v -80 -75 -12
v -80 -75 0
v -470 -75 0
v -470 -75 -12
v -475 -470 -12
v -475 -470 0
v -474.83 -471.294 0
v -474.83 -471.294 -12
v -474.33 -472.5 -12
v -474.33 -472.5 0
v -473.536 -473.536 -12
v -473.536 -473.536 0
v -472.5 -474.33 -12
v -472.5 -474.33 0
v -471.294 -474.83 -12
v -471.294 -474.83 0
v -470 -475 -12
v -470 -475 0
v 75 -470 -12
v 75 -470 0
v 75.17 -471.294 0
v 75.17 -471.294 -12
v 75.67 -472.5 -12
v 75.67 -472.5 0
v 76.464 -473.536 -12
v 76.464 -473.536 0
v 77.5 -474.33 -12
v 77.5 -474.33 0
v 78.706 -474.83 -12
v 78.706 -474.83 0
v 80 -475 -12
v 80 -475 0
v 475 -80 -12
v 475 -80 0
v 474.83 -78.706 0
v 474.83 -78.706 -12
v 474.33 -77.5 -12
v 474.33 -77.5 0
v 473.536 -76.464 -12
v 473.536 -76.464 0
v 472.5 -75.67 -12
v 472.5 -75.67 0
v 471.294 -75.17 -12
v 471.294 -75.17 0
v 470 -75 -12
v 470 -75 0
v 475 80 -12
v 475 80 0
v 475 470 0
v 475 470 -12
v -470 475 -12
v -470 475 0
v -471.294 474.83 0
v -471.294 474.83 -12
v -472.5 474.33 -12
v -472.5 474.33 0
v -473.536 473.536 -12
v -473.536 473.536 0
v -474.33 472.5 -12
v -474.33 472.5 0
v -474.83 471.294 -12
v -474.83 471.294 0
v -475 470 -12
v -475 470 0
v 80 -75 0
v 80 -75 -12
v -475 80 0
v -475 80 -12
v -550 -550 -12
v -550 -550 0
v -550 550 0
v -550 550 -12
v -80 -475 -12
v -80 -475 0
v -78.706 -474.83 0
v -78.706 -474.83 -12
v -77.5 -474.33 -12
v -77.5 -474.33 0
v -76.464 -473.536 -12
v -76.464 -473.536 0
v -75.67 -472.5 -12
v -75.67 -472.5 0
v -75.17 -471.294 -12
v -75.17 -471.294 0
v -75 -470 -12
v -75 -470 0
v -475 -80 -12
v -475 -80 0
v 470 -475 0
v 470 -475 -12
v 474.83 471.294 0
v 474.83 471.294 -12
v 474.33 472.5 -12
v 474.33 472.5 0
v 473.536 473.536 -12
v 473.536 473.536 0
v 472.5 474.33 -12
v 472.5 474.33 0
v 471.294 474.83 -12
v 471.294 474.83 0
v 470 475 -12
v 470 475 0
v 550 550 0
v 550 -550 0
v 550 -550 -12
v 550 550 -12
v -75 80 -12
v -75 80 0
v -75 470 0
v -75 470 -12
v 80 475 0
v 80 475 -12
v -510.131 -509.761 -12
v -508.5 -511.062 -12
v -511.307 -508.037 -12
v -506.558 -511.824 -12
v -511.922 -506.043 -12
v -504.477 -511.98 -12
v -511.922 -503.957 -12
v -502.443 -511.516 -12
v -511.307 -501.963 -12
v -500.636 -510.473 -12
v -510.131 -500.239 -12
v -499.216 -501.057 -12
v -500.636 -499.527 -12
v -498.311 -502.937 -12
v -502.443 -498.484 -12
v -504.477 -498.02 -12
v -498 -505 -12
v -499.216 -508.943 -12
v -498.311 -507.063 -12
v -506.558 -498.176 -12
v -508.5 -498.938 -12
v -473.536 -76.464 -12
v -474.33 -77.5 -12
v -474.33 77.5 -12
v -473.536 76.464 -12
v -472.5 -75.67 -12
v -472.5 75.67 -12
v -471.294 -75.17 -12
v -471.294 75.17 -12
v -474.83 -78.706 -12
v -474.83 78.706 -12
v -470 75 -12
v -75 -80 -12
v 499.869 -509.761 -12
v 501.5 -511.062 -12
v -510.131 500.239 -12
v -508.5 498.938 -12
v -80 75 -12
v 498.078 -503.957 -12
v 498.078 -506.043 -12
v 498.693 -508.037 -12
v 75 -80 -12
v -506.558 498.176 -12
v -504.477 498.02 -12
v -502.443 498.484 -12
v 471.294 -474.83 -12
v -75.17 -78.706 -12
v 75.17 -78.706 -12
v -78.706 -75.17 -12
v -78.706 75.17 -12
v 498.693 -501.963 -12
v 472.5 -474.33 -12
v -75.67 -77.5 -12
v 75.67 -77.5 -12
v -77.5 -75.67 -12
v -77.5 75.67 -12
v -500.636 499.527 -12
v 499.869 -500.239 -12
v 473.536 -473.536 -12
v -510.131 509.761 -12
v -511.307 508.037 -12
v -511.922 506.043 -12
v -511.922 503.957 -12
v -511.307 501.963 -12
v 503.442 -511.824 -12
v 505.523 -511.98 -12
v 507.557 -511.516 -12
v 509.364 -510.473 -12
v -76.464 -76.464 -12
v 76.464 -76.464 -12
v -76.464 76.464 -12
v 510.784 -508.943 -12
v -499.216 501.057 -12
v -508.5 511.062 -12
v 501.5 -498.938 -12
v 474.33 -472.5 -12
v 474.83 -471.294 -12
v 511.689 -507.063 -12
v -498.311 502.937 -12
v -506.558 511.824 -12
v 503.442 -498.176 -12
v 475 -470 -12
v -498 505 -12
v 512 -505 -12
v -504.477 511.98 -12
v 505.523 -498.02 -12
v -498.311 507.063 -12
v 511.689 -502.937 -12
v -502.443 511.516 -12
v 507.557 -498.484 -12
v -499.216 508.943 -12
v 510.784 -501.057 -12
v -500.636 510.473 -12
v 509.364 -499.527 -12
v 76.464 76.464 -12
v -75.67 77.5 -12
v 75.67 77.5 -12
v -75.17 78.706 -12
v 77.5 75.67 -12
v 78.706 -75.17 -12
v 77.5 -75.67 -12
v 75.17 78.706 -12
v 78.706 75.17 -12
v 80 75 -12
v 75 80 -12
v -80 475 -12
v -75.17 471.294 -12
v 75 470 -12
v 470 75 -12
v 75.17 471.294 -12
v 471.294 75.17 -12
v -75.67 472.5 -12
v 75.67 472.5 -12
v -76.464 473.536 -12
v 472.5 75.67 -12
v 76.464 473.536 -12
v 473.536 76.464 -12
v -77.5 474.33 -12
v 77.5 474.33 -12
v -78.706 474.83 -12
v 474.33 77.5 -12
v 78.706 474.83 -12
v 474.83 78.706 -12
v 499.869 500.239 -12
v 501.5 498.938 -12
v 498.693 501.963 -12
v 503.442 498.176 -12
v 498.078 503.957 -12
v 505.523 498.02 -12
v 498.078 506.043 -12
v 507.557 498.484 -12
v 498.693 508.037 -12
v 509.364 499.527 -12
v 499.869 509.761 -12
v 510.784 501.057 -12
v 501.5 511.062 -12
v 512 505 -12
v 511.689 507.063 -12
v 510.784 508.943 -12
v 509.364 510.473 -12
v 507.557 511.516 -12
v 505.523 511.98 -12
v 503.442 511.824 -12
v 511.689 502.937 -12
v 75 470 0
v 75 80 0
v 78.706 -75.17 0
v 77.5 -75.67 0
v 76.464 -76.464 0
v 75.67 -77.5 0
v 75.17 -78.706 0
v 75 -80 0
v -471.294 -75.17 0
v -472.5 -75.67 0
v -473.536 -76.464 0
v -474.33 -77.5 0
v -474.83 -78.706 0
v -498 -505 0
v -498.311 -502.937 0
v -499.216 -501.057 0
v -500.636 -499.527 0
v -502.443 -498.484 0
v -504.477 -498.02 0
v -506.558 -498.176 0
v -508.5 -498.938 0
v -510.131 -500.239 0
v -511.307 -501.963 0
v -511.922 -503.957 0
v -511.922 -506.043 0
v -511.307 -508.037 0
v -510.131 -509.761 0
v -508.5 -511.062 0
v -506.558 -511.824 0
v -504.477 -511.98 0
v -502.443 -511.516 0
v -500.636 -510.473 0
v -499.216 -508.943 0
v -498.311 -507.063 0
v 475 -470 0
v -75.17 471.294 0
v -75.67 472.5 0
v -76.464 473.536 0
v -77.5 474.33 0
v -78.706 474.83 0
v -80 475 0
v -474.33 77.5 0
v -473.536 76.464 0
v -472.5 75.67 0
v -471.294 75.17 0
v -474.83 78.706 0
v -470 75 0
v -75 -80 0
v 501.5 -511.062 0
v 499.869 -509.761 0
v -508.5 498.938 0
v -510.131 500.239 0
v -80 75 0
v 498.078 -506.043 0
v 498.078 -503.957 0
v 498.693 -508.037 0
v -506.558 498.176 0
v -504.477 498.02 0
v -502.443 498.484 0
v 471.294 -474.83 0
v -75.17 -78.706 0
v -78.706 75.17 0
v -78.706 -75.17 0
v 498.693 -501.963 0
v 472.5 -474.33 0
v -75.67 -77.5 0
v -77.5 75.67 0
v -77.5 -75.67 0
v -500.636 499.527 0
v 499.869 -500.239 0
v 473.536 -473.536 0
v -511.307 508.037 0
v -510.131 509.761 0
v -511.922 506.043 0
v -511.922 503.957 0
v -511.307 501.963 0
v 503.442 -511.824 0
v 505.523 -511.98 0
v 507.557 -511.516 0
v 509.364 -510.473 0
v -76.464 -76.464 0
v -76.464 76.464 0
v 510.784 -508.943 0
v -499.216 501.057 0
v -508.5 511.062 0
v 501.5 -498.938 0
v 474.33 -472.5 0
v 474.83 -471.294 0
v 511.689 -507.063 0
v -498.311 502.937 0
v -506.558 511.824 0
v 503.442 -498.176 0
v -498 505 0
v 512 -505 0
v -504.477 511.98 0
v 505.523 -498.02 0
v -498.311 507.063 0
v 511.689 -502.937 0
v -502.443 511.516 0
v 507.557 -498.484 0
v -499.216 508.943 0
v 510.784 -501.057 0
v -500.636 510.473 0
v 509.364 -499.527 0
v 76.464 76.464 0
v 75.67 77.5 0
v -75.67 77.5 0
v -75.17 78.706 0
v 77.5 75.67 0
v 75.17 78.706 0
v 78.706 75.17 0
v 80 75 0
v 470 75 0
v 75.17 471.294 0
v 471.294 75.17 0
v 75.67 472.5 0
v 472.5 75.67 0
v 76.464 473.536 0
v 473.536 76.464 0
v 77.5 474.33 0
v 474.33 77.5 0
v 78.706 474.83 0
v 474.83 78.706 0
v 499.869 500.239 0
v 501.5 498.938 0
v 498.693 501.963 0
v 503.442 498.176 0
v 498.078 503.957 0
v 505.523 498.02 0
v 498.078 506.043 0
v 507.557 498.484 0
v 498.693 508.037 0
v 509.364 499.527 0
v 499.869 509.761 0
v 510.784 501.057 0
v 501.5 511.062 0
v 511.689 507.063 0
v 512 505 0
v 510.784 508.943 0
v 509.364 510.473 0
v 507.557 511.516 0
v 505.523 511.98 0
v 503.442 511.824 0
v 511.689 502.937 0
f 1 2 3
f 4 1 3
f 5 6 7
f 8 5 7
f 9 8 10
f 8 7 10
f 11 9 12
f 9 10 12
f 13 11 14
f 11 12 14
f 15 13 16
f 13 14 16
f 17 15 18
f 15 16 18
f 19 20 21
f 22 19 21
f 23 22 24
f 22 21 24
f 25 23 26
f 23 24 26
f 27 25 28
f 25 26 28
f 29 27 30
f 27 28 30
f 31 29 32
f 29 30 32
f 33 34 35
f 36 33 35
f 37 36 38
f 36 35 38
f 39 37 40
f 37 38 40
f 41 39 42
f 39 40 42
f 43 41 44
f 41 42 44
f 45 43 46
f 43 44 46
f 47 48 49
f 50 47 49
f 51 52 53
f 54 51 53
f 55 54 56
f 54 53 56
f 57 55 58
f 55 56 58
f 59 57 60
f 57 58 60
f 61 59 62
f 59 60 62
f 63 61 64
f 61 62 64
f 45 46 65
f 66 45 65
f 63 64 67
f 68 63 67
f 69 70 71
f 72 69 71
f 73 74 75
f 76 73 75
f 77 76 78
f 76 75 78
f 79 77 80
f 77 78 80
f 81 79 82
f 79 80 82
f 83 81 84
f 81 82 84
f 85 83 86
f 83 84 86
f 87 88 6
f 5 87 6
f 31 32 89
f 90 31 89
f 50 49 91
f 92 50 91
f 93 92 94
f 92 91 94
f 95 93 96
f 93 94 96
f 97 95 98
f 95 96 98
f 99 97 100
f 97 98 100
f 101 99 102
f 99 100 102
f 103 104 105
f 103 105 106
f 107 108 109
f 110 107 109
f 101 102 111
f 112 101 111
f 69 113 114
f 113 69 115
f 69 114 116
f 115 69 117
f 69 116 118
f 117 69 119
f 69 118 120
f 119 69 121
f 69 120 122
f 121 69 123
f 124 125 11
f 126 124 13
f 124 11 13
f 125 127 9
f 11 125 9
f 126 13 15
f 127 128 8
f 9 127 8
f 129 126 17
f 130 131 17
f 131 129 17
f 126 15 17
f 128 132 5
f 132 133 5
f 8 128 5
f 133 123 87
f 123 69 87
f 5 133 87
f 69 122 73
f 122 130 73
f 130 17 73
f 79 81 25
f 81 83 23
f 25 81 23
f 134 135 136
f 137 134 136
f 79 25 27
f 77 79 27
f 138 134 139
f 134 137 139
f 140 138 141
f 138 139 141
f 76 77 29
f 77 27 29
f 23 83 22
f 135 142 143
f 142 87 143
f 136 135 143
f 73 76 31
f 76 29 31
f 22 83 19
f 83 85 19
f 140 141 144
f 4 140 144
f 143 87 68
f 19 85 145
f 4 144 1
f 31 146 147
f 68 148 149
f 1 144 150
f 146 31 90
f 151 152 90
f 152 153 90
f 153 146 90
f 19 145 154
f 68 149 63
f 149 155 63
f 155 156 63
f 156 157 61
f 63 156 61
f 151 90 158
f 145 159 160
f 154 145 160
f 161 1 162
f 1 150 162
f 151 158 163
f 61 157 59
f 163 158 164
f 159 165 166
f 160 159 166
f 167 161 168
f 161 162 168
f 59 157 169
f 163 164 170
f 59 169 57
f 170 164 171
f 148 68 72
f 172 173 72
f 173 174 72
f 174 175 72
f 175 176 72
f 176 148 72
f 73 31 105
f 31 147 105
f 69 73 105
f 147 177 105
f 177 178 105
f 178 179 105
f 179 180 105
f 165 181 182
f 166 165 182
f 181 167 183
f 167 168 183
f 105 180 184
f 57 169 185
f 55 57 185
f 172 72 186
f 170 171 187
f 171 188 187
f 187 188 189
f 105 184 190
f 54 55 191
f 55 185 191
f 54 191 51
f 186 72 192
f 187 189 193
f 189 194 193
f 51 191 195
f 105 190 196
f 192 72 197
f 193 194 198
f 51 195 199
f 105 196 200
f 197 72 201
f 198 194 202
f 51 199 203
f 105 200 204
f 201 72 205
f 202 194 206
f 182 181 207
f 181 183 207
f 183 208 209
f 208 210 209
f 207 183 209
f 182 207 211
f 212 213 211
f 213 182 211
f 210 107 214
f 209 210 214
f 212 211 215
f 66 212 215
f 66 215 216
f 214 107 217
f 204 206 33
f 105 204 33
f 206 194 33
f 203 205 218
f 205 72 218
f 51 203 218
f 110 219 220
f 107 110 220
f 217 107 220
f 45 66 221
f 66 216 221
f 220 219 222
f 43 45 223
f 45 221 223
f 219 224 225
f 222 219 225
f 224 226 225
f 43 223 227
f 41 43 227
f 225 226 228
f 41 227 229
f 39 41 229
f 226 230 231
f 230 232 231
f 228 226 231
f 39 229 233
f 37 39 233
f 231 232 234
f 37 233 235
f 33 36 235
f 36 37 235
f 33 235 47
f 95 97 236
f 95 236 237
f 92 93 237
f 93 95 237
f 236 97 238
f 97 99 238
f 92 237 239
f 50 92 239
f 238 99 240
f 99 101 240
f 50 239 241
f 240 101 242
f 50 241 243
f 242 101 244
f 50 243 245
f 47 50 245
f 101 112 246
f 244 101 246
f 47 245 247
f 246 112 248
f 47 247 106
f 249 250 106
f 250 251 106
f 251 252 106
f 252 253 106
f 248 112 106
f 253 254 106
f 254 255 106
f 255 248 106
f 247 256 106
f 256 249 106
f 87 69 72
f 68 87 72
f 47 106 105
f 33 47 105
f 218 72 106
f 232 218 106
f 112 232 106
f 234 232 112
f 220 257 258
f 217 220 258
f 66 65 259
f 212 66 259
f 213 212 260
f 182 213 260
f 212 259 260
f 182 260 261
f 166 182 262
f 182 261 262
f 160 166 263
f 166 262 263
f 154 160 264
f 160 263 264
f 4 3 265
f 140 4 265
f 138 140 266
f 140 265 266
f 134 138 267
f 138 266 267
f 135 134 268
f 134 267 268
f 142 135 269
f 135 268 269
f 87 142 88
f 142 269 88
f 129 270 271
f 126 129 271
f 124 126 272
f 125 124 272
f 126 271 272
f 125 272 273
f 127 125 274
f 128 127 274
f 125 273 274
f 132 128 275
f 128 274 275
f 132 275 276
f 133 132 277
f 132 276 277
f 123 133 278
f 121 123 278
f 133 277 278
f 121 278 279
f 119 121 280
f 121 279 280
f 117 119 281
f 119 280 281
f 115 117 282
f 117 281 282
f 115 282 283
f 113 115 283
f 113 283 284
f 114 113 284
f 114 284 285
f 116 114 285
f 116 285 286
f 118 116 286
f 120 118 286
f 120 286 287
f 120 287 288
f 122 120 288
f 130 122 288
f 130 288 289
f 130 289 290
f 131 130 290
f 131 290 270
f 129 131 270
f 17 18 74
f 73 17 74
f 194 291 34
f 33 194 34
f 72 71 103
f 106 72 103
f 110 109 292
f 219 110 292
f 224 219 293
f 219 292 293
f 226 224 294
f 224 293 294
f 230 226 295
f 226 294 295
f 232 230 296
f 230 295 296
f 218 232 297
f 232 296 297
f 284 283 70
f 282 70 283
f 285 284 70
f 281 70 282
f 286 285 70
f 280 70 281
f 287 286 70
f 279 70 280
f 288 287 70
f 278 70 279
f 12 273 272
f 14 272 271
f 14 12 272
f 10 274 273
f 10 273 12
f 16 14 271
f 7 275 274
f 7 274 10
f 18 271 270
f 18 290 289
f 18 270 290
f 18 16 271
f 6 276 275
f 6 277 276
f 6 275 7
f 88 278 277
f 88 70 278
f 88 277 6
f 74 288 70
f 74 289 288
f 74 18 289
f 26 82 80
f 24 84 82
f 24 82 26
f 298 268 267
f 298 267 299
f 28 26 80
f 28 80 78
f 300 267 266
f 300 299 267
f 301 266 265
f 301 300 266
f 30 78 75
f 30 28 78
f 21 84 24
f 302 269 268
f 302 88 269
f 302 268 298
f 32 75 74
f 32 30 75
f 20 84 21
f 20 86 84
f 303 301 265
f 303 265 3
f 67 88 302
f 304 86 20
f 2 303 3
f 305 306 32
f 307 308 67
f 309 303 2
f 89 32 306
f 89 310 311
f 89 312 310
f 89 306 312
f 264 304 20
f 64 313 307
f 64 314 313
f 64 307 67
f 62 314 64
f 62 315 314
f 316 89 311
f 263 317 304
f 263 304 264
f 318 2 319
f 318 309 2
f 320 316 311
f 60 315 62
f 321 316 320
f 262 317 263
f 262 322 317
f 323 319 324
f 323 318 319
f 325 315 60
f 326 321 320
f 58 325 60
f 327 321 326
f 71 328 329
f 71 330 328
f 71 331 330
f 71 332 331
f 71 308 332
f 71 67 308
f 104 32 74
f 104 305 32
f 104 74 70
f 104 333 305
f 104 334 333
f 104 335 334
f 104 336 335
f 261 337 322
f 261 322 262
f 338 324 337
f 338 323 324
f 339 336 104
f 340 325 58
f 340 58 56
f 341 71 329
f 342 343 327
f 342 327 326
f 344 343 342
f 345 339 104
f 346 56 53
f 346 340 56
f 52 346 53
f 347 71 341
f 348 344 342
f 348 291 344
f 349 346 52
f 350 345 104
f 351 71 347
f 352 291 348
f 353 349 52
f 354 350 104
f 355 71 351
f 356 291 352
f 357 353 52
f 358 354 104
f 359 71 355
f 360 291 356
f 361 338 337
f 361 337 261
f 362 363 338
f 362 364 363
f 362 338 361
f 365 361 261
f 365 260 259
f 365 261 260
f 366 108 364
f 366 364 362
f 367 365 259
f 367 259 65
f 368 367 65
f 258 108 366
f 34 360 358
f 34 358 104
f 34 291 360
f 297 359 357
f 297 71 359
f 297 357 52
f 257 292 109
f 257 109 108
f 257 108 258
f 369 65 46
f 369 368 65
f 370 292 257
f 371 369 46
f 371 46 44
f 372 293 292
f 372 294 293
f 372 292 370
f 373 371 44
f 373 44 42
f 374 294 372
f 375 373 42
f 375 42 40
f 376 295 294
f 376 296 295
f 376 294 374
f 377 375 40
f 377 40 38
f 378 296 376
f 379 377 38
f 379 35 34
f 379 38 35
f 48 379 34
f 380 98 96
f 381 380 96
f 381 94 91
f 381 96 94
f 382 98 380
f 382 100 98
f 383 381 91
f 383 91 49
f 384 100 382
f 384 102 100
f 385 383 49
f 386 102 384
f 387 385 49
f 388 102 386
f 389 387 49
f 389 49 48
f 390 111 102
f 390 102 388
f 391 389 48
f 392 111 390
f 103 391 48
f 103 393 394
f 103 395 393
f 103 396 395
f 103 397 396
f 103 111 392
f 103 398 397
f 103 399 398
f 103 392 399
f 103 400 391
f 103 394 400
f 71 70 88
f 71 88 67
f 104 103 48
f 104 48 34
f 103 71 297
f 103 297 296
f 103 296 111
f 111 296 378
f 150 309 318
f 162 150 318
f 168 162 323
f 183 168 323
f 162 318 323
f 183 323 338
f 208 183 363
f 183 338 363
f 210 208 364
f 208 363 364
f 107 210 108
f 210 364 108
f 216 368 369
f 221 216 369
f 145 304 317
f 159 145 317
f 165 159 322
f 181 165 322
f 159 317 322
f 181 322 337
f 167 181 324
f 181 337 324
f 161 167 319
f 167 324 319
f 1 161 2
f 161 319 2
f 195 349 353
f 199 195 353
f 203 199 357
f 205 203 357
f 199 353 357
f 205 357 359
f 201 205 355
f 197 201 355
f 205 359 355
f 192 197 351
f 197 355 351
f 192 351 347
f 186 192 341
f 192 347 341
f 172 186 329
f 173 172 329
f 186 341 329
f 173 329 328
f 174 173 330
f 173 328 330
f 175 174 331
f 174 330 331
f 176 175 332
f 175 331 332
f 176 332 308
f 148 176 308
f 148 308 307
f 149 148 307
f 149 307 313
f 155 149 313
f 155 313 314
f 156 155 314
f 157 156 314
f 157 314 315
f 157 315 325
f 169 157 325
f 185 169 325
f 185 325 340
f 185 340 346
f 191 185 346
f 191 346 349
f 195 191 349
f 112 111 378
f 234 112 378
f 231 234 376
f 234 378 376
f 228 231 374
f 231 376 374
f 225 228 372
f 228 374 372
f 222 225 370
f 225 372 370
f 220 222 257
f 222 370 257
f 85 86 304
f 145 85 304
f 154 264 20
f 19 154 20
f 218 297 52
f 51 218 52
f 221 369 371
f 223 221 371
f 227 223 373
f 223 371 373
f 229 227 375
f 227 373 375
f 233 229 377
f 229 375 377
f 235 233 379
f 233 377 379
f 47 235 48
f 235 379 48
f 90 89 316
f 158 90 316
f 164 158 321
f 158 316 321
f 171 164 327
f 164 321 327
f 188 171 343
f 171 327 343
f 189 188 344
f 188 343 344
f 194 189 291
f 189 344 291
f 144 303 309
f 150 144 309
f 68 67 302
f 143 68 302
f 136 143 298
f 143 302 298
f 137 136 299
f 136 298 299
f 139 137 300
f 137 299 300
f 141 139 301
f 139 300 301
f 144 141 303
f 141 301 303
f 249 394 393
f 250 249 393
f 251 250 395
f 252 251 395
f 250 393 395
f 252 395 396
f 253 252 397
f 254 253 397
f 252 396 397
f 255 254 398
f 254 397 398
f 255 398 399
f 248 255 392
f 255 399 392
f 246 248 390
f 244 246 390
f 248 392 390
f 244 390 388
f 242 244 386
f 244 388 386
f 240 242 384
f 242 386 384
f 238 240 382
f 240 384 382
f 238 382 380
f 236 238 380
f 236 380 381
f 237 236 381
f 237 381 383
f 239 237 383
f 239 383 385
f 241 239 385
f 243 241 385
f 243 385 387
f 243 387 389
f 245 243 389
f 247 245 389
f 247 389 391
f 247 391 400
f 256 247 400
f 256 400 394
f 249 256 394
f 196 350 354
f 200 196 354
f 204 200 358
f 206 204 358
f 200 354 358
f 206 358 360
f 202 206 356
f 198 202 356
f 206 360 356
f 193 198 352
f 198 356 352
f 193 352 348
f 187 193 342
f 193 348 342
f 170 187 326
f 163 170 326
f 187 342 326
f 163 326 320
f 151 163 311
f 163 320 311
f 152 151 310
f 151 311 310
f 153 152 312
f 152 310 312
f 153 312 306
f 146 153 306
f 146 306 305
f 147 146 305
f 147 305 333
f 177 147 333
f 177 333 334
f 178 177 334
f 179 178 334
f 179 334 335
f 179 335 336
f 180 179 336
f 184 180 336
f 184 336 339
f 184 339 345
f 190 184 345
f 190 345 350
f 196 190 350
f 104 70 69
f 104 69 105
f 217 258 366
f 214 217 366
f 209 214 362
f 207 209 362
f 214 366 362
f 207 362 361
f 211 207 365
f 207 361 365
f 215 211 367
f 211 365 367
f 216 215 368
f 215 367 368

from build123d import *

# Parameters (mm, degrees)
F0_W     = 1100
F0_H     = 1100
F1_DEPTH = 12
F2_R     = 7
F3_DEPTH = 25
F5_DEPTH = 25


# Not quite as in the source:
# - a feature names something its author has since deleted; it is built from what else it names


with BuildPart() as f1:
    # F0 (on Top) → F1 (new body)
    with BuildSketch(Plane.XY):
        Rectangle(F0_W, F0_H)
    extrude(amount=-F1_DEPTH)

    # F2 (on Top) → F3 (cut)
    with BuildSketch(Plane.XY):
        with Locations((-505, -505)):
            Circle(F2_R)
        with Locations((505, 505)):
            Circle(F2_R)
        with Locations((-505, 505)):
            Circle(F2_R)
        with Locations((505, -505)):
            Circle(F2_R)
    extrude(amount=-F3_DEPTH, mode=Mode.SUBTRACT)

    # F4 (on Top) → F5 (cut)
    with BuildSketch(Plane.XY):
        with BuildLine():
            Line((-80, 475), (-470, 475))
            ThreePointArc((-470, 475), (-473.5355339059, 473.5355339059), (-475, 470))
            Line((-475, 470), (-475, 80))
            ThreePointArc((-475, 80), (-473.5355339059, 76.4644660941), (-470, 75))
            Line((-470, 75), (-80, 75))
            ThreePointArc((-80, 75), (-76.4644660941, 76.4644660941), (-75, 80))
            Line((-75, 80), (-75, 470))
            ThreePointArc((-75, 470), (-76.4644660941, 473.5355339059), (-80, 475))
        make_face()
        with BuildLine():
            ThreePointArc((80, 475), (76.4644660941, 473.5355339059), (75, 470))
            Line((75, 470), (75, 80))
            ThreePointArc((75, 80), (76.4644660941, 76.4644660941), (80, 75))
            Line((80, 75), (470, 75))
            ThreePointArc((470, 75), (473.5355339059, 76.4644660941), (475, 80))
            Line((475, 80), (475, 470))
            ThreePointArc((475, 470), (473.5355339059, 473.5355339059), (470, 475))
            Line((470, 475), (80, 475))
        make_face()
        with BuildLine():
            ThreePointArc((475, -80), (473.5355339059, -76.4644660941), (470, -75))
            Line((470, -75), (80, -75))
            ThreePointArc((80, -75), (76.4644660941, -76.4644660941), (75, -80))
            Line((75, -80), (75, -470))
            ThreePointArc((75, -470), (76.4644660941, -473.5355339059), (80, -475))
            Line((80, -475), (470, -475))
            ThreePointArc((470, -475), (473.5355339059, -473.5355339059), (475, -470))
            Line((475, -470), (475, -80))
        make_face()
        with BuildLine():
            ThreePointArc((-475, -470), (-473.5355339059, -473.5355339059), (-470, -475))
            Line((-470, -475), (-80, -475))
            ThreePointArc((-80, -475), (-76.4644660941, -473.5355339059), (-75, -470))
            Line((-75, -470), (-75, -80))
            ThreePointArc((-75, -80), (-76.4644660941, -76.4644660941), (-80, -75))
            Line((-80, -75), (-470, -75))
            ThreePointArc((-470, -75), (-473.5355339059, -76.4644660941), (-475, -80))
            Line((-475, -80), (-475, -470))
        make_face()
    extrude(amount=-F5_DEPTH, mode=Mode.SUBTRACT)


solid = f1.part
